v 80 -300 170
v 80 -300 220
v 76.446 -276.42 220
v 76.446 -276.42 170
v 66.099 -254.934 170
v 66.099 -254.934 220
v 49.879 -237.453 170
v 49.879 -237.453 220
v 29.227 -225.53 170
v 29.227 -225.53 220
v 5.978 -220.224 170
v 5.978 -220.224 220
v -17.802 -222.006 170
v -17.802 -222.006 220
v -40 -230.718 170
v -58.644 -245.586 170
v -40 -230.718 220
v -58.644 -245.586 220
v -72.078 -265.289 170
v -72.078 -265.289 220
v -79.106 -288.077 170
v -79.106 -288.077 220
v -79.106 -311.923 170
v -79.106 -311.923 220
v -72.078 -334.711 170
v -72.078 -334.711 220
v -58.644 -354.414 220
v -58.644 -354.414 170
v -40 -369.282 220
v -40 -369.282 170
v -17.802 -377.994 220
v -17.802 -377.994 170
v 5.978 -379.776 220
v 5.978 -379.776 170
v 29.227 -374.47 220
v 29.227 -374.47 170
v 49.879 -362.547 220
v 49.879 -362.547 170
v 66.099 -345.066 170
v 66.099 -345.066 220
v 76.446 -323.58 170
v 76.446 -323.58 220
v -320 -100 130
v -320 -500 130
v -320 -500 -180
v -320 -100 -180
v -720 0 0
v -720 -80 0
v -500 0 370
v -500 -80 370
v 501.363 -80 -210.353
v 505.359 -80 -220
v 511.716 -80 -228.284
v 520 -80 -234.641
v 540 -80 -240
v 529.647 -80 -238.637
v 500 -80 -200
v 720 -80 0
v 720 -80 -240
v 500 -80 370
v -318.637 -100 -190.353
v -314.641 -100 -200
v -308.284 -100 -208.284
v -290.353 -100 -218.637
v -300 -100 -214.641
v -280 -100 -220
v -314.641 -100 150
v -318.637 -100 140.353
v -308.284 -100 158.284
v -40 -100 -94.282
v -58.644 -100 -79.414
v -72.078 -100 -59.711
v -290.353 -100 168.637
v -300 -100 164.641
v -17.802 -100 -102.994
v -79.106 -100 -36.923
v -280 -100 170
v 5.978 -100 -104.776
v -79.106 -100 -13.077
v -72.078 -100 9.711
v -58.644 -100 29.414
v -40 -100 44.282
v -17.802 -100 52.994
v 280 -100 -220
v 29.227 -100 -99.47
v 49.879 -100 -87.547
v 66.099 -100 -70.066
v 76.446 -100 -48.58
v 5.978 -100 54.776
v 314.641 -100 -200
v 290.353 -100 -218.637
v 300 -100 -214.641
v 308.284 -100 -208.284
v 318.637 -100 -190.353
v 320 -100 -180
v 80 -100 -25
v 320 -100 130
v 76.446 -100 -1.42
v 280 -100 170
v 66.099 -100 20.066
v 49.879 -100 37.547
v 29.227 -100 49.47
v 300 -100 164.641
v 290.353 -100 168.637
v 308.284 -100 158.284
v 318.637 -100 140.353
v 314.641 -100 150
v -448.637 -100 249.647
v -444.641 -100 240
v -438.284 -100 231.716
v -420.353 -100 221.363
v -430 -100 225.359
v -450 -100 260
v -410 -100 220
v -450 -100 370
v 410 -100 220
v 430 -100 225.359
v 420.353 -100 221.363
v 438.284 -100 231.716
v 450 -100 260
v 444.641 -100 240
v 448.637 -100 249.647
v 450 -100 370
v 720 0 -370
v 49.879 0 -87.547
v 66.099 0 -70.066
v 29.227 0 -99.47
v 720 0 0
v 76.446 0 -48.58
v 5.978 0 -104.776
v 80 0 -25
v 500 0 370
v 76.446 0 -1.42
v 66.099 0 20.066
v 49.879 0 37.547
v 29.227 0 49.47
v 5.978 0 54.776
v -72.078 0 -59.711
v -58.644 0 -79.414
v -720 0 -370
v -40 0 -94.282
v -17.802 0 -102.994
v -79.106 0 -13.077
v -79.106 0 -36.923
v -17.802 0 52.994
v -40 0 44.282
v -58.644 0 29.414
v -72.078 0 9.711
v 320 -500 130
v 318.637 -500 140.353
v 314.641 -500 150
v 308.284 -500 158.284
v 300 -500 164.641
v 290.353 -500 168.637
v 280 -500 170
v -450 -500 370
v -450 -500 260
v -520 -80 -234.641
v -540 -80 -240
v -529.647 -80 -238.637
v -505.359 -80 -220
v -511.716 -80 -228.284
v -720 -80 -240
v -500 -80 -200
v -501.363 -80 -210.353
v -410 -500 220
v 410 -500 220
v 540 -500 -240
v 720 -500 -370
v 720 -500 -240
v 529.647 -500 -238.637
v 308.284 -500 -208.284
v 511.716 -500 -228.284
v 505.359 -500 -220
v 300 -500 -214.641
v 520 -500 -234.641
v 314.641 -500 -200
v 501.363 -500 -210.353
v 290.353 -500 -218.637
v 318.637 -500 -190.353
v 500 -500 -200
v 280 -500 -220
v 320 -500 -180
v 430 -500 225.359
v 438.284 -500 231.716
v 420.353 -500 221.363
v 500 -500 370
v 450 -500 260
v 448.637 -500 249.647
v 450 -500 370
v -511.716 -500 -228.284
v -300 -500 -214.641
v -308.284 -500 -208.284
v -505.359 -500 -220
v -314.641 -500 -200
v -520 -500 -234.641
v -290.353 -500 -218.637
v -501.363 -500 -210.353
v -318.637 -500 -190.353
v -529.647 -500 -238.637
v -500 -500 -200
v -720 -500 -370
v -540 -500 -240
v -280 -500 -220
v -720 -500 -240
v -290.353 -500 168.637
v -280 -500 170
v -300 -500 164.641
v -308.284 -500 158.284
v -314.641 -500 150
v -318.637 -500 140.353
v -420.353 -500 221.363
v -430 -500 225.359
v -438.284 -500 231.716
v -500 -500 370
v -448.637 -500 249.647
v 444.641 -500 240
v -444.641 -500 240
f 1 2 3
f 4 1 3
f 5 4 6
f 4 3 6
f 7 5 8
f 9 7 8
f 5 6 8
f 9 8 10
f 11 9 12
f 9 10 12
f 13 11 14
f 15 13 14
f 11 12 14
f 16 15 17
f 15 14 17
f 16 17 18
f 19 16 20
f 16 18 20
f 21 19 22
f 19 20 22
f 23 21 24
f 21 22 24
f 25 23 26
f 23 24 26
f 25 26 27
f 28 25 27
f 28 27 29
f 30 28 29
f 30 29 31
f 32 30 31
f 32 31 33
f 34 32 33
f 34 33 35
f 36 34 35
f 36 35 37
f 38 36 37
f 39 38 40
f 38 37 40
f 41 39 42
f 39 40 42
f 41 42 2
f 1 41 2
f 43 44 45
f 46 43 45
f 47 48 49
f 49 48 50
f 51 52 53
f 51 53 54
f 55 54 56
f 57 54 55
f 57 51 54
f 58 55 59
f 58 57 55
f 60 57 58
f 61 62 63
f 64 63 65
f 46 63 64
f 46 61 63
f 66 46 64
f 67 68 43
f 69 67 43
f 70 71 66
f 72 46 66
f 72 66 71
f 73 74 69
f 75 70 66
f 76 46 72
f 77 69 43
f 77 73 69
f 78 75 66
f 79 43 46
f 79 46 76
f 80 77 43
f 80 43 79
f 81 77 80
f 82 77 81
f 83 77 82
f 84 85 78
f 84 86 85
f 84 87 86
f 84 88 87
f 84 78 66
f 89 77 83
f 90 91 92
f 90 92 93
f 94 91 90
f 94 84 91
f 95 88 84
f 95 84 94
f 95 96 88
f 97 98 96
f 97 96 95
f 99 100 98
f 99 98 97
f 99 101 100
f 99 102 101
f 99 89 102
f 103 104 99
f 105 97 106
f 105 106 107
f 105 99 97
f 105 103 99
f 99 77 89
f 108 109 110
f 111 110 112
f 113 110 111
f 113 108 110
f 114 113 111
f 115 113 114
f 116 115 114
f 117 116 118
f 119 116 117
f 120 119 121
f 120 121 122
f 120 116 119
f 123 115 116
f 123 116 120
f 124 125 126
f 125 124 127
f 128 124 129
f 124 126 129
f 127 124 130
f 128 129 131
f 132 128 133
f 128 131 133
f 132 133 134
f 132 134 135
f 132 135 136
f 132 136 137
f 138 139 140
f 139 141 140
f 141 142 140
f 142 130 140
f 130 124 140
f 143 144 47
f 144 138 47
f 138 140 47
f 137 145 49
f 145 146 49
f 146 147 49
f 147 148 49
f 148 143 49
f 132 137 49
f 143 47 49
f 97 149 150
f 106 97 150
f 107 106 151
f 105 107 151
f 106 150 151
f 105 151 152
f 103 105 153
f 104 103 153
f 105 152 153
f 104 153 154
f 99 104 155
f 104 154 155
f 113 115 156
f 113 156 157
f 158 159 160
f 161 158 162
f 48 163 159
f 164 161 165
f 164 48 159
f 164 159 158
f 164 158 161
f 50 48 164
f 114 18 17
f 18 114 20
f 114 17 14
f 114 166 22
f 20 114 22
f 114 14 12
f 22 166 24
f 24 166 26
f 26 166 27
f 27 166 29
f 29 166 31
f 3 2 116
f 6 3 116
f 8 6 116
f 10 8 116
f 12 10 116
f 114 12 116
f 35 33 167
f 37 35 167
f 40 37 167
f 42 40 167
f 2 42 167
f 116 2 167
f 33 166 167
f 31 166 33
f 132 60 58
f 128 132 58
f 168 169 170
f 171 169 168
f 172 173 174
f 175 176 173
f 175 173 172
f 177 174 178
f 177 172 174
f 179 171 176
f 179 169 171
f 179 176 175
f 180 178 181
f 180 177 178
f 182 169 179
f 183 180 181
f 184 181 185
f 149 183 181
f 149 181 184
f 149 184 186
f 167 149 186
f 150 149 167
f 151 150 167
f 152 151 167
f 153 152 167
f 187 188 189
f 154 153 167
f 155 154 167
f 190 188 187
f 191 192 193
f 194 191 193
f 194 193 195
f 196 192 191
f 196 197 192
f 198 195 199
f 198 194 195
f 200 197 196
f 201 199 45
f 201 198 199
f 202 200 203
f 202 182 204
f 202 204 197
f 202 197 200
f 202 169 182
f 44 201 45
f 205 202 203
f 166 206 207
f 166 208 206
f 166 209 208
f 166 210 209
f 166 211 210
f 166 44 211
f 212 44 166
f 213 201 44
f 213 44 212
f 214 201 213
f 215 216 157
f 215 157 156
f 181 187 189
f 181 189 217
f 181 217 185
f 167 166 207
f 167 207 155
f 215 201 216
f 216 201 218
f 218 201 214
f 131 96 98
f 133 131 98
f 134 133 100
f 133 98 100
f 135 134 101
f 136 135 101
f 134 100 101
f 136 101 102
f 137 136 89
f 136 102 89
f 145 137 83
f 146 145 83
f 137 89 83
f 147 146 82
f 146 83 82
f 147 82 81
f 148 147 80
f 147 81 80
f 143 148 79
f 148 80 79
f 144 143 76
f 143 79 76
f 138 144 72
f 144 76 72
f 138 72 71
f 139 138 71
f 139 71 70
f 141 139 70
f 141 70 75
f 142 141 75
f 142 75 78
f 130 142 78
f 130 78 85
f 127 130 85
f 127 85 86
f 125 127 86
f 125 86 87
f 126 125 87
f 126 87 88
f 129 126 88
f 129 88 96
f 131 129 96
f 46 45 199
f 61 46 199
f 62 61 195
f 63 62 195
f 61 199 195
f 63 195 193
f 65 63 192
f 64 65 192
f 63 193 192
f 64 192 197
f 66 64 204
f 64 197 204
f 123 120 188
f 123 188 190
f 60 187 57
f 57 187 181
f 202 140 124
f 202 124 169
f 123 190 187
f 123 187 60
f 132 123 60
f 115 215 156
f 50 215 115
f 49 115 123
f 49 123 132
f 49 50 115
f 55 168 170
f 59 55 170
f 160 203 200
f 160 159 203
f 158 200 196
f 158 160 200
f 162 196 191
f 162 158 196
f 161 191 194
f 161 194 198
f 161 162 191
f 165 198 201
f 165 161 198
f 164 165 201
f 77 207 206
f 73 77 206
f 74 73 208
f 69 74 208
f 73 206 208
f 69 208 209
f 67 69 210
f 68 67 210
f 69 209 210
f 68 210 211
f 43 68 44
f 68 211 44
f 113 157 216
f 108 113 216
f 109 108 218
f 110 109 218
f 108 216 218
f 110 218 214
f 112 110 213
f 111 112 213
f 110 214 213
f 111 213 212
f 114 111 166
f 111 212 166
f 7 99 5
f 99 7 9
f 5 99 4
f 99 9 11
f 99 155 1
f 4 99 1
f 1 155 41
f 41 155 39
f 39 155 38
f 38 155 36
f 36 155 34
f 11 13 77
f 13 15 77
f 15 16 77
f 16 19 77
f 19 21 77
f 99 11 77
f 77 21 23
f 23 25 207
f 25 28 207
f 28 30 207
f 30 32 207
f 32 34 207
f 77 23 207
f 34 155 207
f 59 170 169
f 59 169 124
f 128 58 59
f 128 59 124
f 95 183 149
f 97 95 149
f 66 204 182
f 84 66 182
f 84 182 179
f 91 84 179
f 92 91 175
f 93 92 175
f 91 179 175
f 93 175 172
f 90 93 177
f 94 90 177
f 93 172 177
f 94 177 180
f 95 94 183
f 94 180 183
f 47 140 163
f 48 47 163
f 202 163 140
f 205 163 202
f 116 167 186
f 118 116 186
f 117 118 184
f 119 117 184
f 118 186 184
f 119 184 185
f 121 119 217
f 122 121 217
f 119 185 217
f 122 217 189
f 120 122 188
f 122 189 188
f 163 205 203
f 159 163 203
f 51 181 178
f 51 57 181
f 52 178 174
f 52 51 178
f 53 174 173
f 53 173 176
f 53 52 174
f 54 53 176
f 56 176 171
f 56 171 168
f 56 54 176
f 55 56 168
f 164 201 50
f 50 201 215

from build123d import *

# Parameters (mm, degrees)
F0_W      = 1000
F0_H      = 740
F1_DEPTH  = 500
F3_DEPTH  = 400
F4_R      = 80
F5_DEPTH  = 100.001
F7_DEPTH  = 400
F8_W      = 500
F8_H      = 130
F9_DEPTH  = 220
F10_W     = 500
F10_H     = 130
F11_DEPTH = 220
F12_W     = 500
F12_H     = 610
F13_DEPTH = 220
F15_DEPTH = 500.001
F17_DEPTH = 420
F18_W     = 500
F18_H     = 610
F19_DEPTH = 220
F21_DEPTH = 500.001
F23_DEPTH = 420
F24_R     = 80
F25_DEPTH = 50
F26_R     = 40


with BuildPart() as f1:
    # F0 (on Front) → F1 (new body)
    with BuildSketch(Plane.XZ):
        Rectangle(F0_W, F0_H)
    extrude(amount=F1_DEPTH)

    # F2 (on face) → F3 (cut)
    with BuildSketch(Plane.XZ.offset(500)):
        with BuildLine():
            ThreePointArc((320, 130), (308.284271, 158.284271), (280, 170))
            Line((280, 170), (-280, 170))
            ThreePointArc((-280, 170), (-308.284271, 158.284271), (-320, 130))
            Line((-320, 130), (-320, -180))
            ThreePointArc((-320, -180), (-308.284271, -208.284271), (-280, -220))
            Line((-280, -220), (280, -220))
            ThreePointArc((280, -220), (308.284271, -208.284271), (320, -180))
            Line((320, -180), (320, 130))
        make_face()
    extrude(amount=-F3_DEPTH, mode=Mode.SUBTRACT)

    # F4 (on face) → F5 (cut, through all)
    with BuildSketch(Plane.XZ.offset(100)):
        with Locations((0, -25)):
            Circle(F4_R)
    extrude(amount=-F5_DEPTH, mode=Mode.SUBTRACT)

    # F6 (on face) → F7 (cut)
    with BuildSketch(Plane.XZ.offset(500)):
        with BuildLine():
            Line((450, 260), (450, 520))
            Line((450, 520), (-450, 520))
            Line((-450, 520), (-450, 260))
            ThreePointArc((-450, 260), (-438.284271, 231.715729), (-410, 220))
            Line((-410, 220), (410, 220))
            ThreePointArc((410, 220), (438.284271, 231.715729), (450, 260))
        make_face()
    extrude(amount=-F7_DEPTH, mode=Mode.SUBTRACT)

    # F8 (on face) → F9 (join)
    with BuildSketch(Plane.YZ.offset(500)):
        with Locations((-250, -305)):
            Rectangle(F8_W, F8_H)
    extrude(amount=F9_DEPTH)

    # F10 (on face) → F11 (join)
    with BuildSketch(Plane(origin=(-500, 0, 0), x_dir=(0, -1, 0), z_dir=(-1, 0, 0))):
        with Locations((250, -305)):
            Rectangle(F10_W, F10_H)
    extrude(amount=F11_DEPTH)

    # F12 (on face) → F13 (join)
    with BuildSketch(Plane(origin=(-500, 0, 0), x_dir=(0, -1, 0), z_dir=(-1, 0, 0))):
        with Locations((250, 65)):
            Rectangle(F12_W, F12_H)
    extrude(amount=F13_DEPTH)

    # F14 (on face) → F15 (cut, through all)
    with BuildSketch(Plane.XZ.offset(500)):
        Polygon((-720, 370), (-720, 0), (-500, 370), align=None)
    extrude(amount=-F15_DEPTH, mode=Mode.SUBTRACT)

    # F16 (on face) → F17 (cut)
    with BuildSketch(Plane.XZ.offset(500)):
        Polygon((-500, -240), (-500, 370), (-720, 0), (-720, -240), align=None)
    extrude(amount=-F17_DEPTH, mode=Mode.SUBTRACT)

    # F18 (on face) → F19 (join)
    with BuildSketch(Plane.YZ.offset(500)):
        with Locations((-250, 65)):
            Rectangle(F18_W, F18_H)
    extrude(amount=F19_DEPTH)

    # F20 (on face) → F21 (cut, through all)
    with BuildSketch(Plane.XZ.offset(500)):
        Polygon((720, 370), (500, 370), (720, 0), align=None)
    extrude(amount=-F21_DEPTH, mode=Mode.SUBTRACT)

    # F22 (on face) → F23 (cut)
    with BuildSketch(Plane.XZ.offset(500)):
        Polygon((720, 0), (500, 370), (500, -240), (720, -240), align=None)
    extrude(amount=-F23_DEPTH, mode=Mode.SUBTRACT)

    # F24 (on face) → F25 (cut)
    with BuildSketch(Plane.XY.offset(220)):
        with Locations((0, -300)):
            Circle(F24_R)
    extrude(amount=-F25_DEPTH, mode=Mode.SUBTRACT)

    # F26
    f26_edges = [f1.edges().sort_by_distance(p)[0] for p in [
        (-500, -290, -240),
        (500, -290, -240),
    ]]
    fillet(f26_edges, radius=F26_R)


solid = f1.part
